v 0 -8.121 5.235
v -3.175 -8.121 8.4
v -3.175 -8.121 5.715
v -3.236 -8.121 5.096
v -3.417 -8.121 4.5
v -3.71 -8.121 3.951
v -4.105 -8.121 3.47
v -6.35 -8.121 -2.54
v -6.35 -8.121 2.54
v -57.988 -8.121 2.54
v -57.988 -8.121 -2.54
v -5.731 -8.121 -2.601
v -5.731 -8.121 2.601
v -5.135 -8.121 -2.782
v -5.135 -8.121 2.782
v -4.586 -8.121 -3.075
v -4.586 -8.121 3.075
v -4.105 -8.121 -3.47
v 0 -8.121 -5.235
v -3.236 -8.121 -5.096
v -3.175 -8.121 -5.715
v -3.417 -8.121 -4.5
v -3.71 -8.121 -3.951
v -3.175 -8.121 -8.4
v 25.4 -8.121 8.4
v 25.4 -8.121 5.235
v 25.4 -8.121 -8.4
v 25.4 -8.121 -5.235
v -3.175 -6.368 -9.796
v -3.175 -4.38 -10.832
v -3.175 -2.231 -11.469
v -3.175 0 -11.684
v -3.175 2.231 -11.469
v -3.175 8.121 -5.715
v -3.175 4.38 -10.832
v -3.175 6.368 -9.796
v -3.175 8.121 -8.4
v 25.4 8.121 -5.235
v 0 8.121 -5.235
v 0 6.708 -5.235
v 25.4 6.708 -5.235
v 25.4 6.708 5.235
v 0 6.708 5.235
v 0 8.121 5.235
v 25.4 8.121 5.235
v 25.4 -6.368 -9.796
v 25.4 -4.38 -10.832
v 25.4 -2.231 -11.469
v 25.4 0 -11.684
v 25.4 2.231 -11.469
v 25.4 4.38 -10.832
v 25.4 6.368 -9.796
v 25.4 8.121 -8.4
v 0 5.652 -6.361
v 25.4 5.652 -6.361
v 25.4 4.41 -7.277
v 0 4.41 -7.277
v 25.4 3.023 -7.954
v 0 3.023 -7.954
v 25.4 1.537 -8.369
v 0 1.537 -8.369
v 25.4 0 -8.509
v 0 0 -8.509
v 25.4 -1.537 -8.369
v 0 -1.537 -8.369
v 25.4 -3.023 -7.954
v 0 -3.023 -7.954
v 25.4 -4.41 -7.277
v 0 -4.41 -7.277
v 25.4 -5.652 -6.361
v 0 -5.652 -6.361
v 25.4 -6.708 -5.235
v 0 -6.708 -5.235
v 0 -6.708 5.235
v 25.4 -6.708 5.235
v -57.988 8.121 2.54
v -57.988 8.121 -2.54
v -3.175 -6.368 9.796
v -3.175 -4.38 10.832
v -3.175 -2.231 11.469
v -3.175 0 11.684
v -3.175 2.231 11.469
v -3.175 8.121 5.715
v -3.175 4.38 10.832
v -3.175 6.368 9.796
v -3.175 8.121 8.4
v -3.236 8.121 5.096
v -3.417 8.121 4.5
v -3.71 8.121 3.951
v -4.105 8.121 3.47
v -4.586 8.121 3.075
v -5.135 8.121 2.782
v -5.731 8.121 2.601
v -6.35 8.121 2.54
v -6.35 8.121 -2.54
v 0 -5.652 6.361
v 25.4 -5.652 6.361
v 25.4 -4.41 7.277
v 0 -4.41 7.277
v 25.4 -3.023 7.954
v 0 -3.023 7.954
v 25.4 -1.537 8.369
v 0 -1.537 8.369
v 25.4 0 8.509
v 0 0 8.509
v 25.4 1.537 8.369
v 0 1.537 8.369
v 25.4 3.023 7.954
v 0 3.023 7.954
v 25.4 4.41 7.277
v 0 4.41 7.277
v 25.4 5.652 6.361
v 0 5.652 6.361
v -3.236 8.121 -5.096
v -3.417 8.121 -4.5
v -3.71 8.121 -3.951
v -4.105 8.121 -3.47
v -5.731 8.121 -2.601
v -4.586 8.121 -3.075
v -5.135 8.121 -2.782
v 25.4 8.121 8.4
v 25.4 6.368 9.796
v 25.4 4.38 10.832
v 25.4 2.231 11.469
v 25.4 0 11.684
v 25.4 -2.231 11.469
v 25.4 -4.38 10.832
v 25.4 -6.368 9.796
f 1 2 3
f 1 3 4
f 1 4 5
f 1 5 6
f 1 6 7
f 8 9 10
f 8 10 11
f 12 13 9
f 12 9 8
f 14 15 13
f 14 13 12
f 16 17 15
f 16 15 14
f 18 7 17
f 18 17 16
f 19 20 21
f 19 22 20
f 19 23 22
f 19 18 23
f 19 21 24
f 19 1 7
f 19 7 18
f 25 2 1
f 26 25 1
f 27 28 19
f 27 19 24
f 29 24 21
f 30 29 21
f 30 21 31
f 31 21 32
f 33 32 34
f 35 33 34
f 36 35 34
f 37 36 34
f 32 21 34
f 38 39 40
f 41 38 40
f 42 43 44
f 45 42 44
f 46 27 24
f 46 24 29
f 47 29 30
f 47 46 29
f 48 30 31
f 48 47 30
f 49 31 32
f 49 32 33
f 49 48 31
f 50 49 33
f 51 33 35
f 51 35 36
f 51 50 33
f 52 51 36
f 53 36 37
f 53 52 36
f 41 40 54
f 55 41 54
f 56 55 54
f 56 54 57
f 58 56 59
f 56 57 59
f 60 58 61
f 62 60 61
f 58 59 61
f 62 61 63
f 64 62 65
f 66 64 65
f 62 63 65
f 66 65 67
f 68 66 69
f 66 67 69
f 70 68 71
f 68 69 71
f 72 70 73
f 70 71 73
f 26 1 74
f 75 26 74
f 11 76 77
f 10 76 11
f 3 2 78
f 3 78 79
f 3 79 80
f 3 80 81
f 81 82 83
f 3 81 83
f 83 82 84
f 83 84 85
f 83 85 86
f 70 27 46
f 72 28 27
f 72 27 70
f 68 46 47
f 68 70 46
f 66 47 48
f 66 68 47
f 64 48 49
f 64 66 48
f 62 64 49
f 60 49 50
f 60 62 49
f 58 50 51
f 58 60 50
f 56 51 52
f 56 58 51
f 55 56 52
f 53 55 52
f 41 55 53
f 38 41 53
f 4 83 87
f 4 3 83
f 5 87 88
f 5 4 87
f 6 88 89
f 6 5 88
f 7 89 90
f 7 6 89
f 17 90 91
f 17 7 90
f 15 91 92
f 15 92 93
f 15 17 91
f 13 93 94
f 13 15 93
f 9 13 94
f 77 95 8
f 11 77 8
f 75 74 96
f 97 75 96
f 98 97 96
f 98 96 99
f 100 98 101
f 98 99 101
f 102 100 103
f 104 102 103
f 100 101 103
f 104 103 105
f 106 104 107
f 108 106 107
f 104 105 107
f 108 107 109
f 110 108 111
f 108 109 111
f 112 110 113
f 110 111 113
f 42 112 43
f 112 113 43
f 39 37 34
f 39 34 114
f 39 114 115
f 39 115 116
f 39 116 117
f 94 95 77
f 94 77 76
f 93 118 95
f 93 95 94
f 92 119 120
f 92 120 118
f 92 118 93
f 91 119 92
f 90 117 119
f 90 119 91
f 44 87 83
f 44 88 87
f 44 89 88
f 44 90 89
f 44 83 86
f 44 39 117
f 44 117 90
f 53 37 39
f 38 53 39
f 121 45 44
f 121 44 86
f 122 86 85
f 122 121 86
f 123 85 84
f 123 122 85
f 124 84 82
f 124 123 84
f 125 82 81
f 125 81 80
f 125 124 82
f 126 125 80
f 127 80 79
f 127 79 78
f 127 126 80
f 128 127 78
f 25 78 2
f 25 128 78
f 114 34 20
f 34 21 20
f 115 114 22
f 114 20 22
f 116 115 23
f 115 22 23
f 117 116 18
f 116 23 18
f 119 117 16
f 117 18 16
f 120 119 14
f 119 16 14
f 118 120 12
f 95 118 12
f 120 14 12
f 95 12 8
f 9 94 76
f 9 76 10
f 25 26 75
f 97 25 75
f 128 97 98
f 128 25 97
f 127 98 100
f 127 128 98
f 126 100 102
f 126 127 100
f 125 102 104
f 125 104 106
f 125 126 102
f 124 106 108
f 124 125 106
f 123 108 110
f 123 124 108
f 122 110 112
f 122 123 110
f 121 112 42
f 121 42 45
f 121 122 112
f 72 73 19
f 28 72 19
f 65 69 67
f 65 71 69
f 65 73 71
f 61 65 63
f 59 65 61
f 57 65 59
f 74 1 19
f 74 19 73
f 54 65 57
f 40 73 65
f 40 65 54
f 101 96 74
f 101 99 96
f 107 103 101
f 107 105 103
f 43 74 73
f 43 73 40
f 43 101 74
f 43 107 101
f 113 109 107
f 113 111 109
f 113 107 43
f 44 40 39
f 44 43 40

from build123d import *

# Parameters (mm, degrees)
F1_DEPTH = 25.4
F2_DEPTH = 3.175
F3_W     = 16.2421034352
F3_H     = 5.08
F4_DEPTH = 54.8132
F5_R     = 3.175


with BuildPart() as f1:
    # F0 (on Right) → F1 (new body)
    with BuildSketch(Plane.YZ):
        with BuildLine():
            Line((-8.1210517176, 8.4002604126), (-8.1210517176, 5.2353069186))
            Line((-8.1210517176, 5.2353069186), (-6.7078045937, 5.2353069186))
            ThreePointArc((-6.7078045937, 5.2353069186), (0, 8.509), (6.7078045937, 5.2353069186))
            Line((6.7078045937, 5.2353069186), (8.1210517176, 5.2353069186))
            Line((8.1210517176, 5.2353069186), (8.1210517176, 8.4002604126))
            ThreePointArc((8.1210517176, 8.4002604126), (0, 11.684), (-8.1210517176, 8.4002604126))
        make_face()
    extrude(amount=F1_DEPTH)



with BuildPart() as f1b:
    # F0 (on Right) → F1, piece 2 (new body)
    with BuildSketch(Plane.YZ):
        with BuildLine():
            Line((-8.1210517176, -5.2353069186), (-8.1210517176, -8.4002604126))
            ThreePointArc((-8.1210517176, -8.4002604126), (0, -11.684), (8.1210517176, -8.4002604126))
            Line((8.1210517176, -8.4002604126), (8.1210517176, -5.2353069186))
            Line((8.1210517176, -5.2353069186), (6.7078045937, -5.2353069186))
            ThreePointArc((6.7078045937, -5.2353069186), (0, -8.509), (-6.7078045937, -5.2353069186))
            Line((-6.7078045937, -5.2353069186), (-8.1210517176, -5.2353069186))
        make_face()
    extrude(amount=F1_DEPTH)


with BuildPart() as f1_1:
    add(f1.part)

    add(f1b.part)  # F2 merges F1b
    # F0 (on Right) → F2 (join)
    with BuildSketch(Plane.YZ):
        with BuildLine():
            Line((-8.1210517176, 5.2353069186), (-8.1210517176, -5.2353069186))
            Line((-8.1210517176, -5.2353069186), (-6.7078045937, -5.2353069186))
            ThreePointArc((-6.7078045937, -5.2353069186), (0, -8.509), (6.7078045937, -5.2353069186))
            Line((6.7078045937, -5.2353069186), (8.1210517176, -5.2353069186))
            Line((8.1210517176, -5.2353069186), (8.1210517176, 5.2353069186))
            Line((8.1210517176, 5.2353069186), (6.7078045937, 5.2353069186))
            ThreePointArc((6.7078045937, 5.2353069186), (0, 8.509), (-6.7078045937, 5.2353069186))
            Line((-6.7078045937, 5.2353069186), (-8.1210517176, 5.2353069186))
        make_face()
        with BuildLine():
            Line((-8.1210517176, 8.4002604126), (-8.1210517176, 5.2353069186))
            Line((-8.1210517176, 5.2353069186), (-6.7078045937, 5.2353069186))
            ThreePointArc((-6.7078045937, 5.2353069186), (0, 8.509), (6.7078045937, 5.2353069186))
            Line((6.7078045937, 5.2353069186), (8.1210517176, 5.2353069186))
            Line((8.1210517176, 5.2353069186), (8.1210517176, 8.4002604126))
            ThreePointArc((8.1210517176, 8.4002604126), (0, 11.684), (-8.1210517176, 8.4002604126))
        make_face()
        with BuildLine():
            Line((-8.1210517176, -5.2353069186), (-8.1210517176, -8.4002604126))
            ThreePointArc((-8.1210517176, -8.4002604126), (0, -11.684), (8.1210517176, -8.4002604126))
            Line((8.1210517176, -8.4002604126), (8.1210517176, -5.2353069186))
            Line((8.1210517176, -5.2353069186), (6.7078045937, -5.2353069186))
            ThreePointArc((6.7078045937, -5.2353069186), (0, -8.509), (-6.7078045937, -5.2353069186))
            Line((-6.7078045937, -5.2353069186), (-8.1210517176, -5.2353069186))
        make_face()
    extrude(amount=-F2_DEPTH)

    # F3 (on face) → F4 (join)
    with BuildSketch(Plane(origin=(-3.175, 0, 0), x_dir=(0, -1, 0), z_dir=(-1, 0, 0))):
        Rectangle(F3_W, F3_H)
    extrude(amount=F4_DEPTH)

    # F5
    f5_edges = [f1_1.edges().sort_by_distance(p)[0] for p in [
        (-3.175, 0, 2.54),
        (-3.175, 0, -2.54),
    ]]
    fillet(f5_edges, radius=F5_R)


solid = f1_1.part
